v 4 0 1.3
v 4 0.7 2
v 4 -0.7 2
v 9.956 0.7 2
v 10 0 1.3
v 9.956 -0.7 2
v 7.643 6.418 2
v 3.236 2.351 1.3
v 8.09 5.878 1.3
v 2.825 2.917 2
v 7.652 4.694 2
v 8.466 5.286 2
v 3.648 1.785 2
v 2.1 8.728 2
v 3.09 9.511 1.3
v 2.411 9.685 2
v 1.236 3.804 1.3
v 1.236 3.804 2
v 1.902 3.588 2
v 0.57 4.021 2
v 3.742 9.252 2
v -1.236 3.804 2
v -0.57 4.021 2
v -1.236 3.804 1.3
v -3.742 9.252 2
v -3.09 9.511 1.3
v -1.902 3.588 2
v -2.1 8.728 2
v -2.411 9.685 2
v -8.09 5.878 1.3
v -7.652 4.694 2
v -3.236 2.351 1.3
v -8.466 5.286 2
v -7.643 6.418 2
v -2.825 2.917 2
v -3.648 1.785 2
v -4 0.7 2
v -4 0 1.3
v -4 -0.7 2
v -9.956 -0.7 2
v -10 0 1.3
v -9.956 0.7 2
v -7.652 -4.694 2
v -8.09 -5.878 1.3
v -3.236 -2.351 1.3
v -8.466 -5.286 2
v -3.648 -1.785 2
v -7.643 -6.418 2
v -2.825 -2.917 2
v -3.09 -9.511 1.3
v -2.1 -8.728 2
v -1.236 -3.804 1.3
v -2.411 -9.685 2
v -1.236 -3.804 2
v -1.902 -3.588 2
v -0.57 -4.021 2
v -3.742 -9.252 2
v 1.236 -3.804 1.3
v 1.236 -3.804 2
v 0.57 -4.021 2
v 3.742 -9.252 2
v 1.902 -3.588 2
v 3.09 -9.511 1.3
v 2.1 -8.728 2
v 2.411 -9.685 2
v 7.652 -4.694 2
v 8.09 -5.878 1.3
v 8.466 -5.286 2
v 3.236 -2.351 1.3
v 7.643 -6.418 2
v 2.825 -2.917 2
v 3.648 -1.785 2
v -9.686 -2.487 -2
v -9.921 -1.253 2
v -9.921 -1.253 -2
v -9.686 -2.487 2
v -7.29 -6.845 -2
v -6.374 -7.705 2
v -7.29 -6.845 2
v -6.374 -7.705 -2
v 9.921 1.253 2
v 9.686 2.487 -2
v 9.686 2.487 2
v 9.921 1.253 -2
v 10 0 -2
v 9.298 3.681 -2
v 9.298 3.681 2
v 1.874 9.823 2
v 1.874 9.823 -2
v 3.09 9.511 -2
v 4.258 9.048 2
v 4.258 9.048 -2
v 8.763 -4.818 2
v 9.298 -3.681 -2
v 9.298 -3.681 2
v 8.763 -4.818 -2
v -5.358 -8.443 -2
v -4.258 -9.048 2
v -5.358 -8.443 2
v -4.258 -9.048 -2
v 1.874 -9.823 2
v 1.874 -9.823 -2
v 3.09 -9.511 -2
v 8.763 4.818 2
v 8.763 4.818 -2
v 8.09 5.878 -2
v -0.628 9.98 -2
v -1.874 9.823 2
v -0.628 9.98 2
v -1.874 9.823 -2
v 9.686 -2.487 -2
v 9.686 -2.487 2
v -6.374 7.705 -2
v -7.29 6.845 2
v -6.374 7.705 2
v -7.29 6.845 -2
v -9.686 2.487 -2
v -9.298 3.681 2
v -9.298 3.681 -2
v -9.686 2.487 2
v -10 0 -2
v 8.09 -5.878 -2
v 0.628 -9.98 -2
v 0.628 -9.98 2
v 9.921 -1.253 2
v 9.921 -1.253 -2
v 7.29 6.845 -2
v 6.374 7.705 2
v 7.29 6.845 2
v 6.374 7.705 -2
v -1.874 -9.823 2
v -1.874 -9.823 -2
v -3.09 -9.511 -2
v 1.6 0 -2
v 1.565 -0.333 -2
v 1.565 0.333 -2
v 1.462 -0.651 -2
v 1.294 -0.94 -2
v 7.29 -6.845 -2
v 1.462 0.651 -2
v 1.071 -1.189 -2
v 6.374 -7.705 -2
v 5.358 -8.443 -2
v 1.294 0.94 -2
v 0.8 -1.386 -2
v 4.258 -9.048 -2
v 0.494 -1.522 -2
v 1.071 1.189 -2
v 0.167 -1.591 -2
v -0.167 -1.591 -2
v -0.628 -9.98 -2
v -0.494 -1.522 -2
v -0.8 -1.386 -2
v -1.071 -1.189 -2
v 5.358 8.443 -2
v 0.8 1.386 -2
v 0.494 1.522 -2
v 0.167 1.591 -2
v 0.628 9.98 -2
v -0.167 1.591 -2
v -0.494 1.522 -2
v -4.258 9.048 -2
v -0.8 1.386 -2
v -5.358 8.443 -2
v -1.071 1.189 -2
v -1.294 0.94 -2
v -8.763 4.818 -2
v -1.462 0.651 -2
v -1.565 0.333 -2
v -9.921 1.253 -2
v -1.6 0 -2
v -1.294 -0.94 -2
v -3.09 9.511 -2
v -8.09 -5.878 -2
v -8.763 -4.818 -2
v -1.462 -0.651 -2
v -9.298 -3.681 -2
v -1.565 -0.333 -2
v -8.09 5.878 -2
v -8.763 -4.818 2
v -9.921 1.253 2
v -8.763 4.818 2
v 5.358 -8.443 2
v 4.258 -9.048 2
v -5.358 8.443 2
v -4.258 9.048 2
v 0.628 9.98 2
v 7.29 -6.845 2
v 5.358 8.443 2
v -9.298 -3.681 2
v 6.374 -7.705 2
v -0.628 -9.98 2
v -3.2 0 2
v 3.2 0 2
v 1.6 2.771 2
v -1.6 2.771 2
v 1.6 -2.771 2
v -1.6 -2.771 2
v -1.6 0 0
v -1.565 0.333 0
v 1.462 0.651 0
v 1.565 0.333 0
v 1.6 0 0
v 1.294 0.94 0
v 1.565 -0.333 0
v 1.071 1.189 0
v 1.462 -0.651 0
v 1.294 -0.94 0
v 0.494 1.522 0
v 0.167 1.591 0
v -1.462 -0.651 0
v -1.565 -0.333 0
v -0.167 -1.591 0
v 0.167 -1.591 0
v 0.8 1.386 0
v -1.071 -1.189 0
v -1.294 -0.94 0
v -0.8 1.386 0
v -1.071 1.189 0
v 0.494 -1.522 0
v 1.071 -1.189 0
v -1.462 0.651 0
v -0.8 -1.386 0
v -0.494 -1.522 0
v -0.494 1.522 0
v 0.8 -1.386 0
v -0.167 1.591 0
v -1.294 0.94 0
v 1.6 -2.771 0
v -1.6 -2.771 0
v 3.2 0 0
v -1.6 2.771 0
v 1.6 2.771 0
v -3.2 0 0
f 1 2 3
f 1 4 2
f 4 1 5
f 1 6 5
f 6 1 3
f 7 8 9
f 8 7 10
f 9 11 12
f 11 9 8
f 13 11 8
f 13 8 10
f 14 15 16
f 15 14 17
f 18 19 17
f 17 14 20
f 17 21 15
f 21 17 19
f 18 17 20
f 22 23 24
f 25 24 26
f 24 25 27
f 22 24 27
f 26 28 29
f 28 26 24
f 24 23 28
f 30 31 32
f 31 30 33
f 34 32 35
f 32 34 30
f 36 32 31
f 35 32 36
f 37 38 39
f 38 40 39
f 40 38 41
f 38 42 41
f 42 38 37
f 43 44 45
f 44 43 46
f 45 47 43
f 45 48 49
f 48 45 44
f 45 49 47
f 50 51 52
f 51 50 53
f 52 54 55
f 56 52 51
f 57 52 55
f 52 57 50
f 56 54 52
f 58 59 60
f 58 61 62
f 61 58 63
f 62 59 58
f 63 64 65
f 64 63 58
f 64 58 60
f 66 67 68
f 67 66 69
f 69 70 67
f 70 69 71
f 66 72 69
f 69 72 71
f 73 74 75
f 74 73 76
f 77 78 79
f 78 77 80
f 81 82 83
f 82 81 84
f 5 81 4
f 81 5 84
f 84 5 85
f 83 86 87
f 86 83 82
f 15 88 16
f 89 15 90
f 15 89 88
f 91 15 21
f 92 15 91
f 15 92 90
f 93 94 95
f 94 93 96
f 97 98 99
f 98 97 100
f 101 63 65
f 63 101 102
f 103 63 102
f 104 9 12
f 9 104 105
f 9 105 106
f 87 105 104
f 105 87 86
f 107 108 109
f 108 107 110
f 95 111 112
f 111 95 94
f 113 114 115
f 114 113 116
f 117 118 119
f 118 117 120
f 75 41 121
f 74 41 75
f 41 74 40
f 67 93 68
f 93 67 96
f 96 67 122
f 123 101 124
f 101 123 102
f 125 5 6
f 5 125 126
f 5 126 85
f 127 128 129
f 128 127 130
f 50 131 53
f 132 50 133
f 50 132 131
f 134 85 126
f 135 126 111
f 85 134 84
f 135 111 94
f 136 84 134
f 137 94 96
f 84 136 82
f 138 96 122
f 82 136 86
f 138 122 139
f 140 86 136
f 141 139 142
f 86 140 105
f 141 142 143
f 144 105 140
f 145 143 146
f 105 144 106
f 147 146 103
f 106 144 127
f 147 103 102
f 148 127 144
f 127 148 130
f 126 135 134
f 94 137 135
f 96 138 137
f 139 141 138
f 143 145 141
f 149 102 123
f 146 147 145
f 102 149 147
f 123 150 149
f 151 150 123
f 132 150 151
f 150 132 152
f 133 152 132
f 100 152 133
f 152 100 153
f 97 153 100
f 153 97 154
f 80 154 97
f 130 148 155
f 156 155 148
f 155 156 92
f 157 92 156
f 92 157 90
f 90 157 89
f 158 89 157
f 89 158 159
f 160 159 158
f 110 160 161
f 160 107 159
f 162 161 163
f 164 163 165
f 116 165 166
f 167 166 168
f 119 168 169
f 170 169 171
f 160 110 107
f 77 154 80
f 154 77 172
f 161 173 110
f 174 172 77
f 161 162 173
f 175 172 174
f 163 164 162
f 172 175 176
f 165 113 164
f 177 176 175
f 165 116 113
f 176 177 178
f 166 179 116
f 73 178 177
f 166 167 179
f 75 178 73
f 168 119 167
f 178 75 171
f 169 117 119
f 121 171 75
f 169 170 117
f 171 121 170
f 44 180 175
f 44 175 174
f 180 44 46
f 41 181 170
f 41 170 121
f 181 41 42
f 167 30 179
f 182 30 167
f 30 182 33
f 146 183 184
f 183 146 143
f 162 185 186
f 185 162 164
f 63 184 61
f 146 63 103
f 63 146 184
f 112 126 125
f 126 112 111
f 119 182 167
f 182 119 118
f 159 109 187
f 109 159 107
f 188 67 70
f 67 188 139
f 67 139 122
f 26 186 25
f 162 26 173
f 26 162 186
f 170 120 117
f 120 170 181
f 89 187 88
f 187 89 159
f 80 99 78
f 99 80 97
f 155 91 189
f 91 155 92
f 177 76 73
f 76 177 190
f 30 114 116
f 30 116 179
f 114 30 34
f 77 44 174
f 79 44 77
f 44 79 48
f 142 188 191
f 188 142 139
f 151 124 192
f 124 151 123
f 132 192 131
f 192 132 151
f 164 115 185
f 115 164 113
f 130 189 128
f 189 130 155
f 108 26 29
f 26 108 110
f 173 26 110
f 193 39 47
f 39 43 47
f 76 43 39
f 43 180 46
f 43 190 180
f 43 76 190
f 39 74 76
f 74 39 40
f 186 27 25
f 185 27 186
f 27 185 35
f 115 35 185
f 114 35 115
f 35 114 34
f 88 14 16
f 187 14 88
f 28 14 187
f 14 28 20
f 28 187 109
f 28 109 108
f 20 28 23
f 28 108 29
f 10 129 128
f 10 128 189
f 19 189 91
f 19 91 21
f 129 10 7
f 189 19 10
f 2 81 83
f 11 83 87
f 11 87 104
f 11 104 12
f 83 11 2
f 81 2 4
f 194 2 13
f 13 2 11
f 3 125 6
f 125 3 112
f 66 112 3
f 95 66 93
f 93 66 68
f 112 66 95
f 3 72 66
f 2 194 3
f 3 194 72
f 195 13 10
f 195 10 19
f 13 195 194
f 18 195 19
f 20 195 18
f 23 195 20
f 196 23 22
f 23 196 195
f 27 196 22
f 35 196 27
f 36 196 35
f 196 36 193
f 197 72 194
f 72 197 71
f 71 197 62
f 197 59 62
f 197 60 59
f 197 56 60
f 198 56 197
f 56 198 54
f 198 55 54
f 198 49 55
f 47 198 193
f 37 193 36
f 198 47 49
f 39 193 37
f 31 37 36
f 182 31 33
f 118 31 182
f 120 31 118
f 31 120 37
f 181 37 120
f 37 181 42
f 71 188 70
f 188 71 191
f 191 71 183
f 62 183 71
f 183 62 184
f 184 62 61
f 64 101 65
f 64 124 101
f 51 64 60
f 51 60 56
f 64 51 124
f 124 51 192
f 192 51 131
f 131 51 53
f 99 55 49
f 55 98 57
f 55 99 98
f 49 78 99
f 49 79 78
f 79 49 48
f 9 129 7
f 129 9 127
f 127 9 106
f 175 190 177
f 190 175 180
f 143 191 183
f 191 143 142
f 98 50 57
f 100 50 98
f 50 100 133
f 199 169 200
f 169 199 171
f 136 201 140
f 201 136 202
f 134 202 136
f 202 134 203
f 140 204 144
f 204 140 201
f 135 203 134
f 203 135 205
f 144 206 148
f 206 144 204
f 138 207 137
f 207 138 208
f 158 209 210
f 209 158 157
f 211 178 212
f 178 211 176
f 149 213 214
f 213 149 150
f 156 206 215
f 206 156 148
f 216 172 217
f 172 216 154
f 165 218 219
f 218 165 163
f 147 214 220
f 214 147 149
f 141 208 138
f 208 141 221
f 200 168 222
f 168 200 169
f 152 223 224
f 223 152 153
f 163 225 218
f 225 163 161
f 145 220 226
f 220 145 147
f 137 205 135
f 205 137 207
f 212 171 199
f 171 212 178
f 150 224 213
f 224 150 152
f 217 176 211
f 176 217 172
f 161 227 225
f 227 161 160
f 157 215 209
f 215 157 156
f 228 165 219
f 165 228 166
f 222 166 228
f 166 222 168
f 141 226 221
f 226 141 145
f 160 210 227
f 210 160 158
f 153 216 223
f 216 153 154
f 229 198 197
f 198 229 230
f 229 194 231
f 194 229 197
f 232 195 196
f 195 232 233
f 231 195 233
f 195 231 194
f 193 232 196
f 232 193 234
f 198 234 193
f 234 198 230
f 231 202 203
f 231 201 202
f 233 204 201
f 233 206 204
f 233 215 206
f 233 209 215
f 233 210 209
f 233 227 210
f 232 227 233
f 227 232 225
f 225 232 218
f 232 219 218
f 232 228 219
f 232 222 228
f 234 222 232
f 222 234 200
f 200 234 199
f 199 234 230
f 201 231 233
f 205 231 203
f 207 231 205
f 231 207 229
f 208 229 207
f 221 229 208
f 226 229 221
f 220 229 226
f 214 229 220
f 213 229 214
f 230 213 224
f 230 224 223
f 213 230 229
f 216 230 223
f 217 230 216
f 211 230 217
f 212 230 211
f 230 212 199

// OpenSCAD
long = 90;

module Gauge()
{
	difference()
	{
		 union()
		 {
			cube([long,8,8]);
			rotate([0,0,5])
			cube([8,long,8]);
		 }
		 translate([-5, long-5, 4])
		 {
			 rotate([0,90,0])
				cylinder(r=1.6,h=30,center=true,$fn=30);
			 translate([16,0,0])
			 rotate([0,90,0])
				rotate([0,0,30])
				cylinder(r=3.2,h=30,center=true,$fn=6);
			 translate([-10,-15,-10])
			 cube([8,25,20]);
		 }
	}
}

module ThumbWheel()
{
	difference()
	{
		cylinder(r=10,h=4,center=true,$fn=50);
		cylinder(r=1.6,h=30,center=true,$fn=30);
	
		translate([0,0,15])
			cylinder(r=3.2,h=30,center=true,$fn=6);
		for(a = [0 : 9] )
		{
		rotate([0,0,36*a])
		translate([4,0,1.3])
			rotate([45,0,0])
				cube([20,4,4]);
		}
	}
}


module TestPiece()
{
 union()
 {
	cube([long,8,8]);
	cube([8,long,8]);
	cube([10,10,long]);
 }
}

//TestPiece();

//Gauge();

ThumbWheel();
